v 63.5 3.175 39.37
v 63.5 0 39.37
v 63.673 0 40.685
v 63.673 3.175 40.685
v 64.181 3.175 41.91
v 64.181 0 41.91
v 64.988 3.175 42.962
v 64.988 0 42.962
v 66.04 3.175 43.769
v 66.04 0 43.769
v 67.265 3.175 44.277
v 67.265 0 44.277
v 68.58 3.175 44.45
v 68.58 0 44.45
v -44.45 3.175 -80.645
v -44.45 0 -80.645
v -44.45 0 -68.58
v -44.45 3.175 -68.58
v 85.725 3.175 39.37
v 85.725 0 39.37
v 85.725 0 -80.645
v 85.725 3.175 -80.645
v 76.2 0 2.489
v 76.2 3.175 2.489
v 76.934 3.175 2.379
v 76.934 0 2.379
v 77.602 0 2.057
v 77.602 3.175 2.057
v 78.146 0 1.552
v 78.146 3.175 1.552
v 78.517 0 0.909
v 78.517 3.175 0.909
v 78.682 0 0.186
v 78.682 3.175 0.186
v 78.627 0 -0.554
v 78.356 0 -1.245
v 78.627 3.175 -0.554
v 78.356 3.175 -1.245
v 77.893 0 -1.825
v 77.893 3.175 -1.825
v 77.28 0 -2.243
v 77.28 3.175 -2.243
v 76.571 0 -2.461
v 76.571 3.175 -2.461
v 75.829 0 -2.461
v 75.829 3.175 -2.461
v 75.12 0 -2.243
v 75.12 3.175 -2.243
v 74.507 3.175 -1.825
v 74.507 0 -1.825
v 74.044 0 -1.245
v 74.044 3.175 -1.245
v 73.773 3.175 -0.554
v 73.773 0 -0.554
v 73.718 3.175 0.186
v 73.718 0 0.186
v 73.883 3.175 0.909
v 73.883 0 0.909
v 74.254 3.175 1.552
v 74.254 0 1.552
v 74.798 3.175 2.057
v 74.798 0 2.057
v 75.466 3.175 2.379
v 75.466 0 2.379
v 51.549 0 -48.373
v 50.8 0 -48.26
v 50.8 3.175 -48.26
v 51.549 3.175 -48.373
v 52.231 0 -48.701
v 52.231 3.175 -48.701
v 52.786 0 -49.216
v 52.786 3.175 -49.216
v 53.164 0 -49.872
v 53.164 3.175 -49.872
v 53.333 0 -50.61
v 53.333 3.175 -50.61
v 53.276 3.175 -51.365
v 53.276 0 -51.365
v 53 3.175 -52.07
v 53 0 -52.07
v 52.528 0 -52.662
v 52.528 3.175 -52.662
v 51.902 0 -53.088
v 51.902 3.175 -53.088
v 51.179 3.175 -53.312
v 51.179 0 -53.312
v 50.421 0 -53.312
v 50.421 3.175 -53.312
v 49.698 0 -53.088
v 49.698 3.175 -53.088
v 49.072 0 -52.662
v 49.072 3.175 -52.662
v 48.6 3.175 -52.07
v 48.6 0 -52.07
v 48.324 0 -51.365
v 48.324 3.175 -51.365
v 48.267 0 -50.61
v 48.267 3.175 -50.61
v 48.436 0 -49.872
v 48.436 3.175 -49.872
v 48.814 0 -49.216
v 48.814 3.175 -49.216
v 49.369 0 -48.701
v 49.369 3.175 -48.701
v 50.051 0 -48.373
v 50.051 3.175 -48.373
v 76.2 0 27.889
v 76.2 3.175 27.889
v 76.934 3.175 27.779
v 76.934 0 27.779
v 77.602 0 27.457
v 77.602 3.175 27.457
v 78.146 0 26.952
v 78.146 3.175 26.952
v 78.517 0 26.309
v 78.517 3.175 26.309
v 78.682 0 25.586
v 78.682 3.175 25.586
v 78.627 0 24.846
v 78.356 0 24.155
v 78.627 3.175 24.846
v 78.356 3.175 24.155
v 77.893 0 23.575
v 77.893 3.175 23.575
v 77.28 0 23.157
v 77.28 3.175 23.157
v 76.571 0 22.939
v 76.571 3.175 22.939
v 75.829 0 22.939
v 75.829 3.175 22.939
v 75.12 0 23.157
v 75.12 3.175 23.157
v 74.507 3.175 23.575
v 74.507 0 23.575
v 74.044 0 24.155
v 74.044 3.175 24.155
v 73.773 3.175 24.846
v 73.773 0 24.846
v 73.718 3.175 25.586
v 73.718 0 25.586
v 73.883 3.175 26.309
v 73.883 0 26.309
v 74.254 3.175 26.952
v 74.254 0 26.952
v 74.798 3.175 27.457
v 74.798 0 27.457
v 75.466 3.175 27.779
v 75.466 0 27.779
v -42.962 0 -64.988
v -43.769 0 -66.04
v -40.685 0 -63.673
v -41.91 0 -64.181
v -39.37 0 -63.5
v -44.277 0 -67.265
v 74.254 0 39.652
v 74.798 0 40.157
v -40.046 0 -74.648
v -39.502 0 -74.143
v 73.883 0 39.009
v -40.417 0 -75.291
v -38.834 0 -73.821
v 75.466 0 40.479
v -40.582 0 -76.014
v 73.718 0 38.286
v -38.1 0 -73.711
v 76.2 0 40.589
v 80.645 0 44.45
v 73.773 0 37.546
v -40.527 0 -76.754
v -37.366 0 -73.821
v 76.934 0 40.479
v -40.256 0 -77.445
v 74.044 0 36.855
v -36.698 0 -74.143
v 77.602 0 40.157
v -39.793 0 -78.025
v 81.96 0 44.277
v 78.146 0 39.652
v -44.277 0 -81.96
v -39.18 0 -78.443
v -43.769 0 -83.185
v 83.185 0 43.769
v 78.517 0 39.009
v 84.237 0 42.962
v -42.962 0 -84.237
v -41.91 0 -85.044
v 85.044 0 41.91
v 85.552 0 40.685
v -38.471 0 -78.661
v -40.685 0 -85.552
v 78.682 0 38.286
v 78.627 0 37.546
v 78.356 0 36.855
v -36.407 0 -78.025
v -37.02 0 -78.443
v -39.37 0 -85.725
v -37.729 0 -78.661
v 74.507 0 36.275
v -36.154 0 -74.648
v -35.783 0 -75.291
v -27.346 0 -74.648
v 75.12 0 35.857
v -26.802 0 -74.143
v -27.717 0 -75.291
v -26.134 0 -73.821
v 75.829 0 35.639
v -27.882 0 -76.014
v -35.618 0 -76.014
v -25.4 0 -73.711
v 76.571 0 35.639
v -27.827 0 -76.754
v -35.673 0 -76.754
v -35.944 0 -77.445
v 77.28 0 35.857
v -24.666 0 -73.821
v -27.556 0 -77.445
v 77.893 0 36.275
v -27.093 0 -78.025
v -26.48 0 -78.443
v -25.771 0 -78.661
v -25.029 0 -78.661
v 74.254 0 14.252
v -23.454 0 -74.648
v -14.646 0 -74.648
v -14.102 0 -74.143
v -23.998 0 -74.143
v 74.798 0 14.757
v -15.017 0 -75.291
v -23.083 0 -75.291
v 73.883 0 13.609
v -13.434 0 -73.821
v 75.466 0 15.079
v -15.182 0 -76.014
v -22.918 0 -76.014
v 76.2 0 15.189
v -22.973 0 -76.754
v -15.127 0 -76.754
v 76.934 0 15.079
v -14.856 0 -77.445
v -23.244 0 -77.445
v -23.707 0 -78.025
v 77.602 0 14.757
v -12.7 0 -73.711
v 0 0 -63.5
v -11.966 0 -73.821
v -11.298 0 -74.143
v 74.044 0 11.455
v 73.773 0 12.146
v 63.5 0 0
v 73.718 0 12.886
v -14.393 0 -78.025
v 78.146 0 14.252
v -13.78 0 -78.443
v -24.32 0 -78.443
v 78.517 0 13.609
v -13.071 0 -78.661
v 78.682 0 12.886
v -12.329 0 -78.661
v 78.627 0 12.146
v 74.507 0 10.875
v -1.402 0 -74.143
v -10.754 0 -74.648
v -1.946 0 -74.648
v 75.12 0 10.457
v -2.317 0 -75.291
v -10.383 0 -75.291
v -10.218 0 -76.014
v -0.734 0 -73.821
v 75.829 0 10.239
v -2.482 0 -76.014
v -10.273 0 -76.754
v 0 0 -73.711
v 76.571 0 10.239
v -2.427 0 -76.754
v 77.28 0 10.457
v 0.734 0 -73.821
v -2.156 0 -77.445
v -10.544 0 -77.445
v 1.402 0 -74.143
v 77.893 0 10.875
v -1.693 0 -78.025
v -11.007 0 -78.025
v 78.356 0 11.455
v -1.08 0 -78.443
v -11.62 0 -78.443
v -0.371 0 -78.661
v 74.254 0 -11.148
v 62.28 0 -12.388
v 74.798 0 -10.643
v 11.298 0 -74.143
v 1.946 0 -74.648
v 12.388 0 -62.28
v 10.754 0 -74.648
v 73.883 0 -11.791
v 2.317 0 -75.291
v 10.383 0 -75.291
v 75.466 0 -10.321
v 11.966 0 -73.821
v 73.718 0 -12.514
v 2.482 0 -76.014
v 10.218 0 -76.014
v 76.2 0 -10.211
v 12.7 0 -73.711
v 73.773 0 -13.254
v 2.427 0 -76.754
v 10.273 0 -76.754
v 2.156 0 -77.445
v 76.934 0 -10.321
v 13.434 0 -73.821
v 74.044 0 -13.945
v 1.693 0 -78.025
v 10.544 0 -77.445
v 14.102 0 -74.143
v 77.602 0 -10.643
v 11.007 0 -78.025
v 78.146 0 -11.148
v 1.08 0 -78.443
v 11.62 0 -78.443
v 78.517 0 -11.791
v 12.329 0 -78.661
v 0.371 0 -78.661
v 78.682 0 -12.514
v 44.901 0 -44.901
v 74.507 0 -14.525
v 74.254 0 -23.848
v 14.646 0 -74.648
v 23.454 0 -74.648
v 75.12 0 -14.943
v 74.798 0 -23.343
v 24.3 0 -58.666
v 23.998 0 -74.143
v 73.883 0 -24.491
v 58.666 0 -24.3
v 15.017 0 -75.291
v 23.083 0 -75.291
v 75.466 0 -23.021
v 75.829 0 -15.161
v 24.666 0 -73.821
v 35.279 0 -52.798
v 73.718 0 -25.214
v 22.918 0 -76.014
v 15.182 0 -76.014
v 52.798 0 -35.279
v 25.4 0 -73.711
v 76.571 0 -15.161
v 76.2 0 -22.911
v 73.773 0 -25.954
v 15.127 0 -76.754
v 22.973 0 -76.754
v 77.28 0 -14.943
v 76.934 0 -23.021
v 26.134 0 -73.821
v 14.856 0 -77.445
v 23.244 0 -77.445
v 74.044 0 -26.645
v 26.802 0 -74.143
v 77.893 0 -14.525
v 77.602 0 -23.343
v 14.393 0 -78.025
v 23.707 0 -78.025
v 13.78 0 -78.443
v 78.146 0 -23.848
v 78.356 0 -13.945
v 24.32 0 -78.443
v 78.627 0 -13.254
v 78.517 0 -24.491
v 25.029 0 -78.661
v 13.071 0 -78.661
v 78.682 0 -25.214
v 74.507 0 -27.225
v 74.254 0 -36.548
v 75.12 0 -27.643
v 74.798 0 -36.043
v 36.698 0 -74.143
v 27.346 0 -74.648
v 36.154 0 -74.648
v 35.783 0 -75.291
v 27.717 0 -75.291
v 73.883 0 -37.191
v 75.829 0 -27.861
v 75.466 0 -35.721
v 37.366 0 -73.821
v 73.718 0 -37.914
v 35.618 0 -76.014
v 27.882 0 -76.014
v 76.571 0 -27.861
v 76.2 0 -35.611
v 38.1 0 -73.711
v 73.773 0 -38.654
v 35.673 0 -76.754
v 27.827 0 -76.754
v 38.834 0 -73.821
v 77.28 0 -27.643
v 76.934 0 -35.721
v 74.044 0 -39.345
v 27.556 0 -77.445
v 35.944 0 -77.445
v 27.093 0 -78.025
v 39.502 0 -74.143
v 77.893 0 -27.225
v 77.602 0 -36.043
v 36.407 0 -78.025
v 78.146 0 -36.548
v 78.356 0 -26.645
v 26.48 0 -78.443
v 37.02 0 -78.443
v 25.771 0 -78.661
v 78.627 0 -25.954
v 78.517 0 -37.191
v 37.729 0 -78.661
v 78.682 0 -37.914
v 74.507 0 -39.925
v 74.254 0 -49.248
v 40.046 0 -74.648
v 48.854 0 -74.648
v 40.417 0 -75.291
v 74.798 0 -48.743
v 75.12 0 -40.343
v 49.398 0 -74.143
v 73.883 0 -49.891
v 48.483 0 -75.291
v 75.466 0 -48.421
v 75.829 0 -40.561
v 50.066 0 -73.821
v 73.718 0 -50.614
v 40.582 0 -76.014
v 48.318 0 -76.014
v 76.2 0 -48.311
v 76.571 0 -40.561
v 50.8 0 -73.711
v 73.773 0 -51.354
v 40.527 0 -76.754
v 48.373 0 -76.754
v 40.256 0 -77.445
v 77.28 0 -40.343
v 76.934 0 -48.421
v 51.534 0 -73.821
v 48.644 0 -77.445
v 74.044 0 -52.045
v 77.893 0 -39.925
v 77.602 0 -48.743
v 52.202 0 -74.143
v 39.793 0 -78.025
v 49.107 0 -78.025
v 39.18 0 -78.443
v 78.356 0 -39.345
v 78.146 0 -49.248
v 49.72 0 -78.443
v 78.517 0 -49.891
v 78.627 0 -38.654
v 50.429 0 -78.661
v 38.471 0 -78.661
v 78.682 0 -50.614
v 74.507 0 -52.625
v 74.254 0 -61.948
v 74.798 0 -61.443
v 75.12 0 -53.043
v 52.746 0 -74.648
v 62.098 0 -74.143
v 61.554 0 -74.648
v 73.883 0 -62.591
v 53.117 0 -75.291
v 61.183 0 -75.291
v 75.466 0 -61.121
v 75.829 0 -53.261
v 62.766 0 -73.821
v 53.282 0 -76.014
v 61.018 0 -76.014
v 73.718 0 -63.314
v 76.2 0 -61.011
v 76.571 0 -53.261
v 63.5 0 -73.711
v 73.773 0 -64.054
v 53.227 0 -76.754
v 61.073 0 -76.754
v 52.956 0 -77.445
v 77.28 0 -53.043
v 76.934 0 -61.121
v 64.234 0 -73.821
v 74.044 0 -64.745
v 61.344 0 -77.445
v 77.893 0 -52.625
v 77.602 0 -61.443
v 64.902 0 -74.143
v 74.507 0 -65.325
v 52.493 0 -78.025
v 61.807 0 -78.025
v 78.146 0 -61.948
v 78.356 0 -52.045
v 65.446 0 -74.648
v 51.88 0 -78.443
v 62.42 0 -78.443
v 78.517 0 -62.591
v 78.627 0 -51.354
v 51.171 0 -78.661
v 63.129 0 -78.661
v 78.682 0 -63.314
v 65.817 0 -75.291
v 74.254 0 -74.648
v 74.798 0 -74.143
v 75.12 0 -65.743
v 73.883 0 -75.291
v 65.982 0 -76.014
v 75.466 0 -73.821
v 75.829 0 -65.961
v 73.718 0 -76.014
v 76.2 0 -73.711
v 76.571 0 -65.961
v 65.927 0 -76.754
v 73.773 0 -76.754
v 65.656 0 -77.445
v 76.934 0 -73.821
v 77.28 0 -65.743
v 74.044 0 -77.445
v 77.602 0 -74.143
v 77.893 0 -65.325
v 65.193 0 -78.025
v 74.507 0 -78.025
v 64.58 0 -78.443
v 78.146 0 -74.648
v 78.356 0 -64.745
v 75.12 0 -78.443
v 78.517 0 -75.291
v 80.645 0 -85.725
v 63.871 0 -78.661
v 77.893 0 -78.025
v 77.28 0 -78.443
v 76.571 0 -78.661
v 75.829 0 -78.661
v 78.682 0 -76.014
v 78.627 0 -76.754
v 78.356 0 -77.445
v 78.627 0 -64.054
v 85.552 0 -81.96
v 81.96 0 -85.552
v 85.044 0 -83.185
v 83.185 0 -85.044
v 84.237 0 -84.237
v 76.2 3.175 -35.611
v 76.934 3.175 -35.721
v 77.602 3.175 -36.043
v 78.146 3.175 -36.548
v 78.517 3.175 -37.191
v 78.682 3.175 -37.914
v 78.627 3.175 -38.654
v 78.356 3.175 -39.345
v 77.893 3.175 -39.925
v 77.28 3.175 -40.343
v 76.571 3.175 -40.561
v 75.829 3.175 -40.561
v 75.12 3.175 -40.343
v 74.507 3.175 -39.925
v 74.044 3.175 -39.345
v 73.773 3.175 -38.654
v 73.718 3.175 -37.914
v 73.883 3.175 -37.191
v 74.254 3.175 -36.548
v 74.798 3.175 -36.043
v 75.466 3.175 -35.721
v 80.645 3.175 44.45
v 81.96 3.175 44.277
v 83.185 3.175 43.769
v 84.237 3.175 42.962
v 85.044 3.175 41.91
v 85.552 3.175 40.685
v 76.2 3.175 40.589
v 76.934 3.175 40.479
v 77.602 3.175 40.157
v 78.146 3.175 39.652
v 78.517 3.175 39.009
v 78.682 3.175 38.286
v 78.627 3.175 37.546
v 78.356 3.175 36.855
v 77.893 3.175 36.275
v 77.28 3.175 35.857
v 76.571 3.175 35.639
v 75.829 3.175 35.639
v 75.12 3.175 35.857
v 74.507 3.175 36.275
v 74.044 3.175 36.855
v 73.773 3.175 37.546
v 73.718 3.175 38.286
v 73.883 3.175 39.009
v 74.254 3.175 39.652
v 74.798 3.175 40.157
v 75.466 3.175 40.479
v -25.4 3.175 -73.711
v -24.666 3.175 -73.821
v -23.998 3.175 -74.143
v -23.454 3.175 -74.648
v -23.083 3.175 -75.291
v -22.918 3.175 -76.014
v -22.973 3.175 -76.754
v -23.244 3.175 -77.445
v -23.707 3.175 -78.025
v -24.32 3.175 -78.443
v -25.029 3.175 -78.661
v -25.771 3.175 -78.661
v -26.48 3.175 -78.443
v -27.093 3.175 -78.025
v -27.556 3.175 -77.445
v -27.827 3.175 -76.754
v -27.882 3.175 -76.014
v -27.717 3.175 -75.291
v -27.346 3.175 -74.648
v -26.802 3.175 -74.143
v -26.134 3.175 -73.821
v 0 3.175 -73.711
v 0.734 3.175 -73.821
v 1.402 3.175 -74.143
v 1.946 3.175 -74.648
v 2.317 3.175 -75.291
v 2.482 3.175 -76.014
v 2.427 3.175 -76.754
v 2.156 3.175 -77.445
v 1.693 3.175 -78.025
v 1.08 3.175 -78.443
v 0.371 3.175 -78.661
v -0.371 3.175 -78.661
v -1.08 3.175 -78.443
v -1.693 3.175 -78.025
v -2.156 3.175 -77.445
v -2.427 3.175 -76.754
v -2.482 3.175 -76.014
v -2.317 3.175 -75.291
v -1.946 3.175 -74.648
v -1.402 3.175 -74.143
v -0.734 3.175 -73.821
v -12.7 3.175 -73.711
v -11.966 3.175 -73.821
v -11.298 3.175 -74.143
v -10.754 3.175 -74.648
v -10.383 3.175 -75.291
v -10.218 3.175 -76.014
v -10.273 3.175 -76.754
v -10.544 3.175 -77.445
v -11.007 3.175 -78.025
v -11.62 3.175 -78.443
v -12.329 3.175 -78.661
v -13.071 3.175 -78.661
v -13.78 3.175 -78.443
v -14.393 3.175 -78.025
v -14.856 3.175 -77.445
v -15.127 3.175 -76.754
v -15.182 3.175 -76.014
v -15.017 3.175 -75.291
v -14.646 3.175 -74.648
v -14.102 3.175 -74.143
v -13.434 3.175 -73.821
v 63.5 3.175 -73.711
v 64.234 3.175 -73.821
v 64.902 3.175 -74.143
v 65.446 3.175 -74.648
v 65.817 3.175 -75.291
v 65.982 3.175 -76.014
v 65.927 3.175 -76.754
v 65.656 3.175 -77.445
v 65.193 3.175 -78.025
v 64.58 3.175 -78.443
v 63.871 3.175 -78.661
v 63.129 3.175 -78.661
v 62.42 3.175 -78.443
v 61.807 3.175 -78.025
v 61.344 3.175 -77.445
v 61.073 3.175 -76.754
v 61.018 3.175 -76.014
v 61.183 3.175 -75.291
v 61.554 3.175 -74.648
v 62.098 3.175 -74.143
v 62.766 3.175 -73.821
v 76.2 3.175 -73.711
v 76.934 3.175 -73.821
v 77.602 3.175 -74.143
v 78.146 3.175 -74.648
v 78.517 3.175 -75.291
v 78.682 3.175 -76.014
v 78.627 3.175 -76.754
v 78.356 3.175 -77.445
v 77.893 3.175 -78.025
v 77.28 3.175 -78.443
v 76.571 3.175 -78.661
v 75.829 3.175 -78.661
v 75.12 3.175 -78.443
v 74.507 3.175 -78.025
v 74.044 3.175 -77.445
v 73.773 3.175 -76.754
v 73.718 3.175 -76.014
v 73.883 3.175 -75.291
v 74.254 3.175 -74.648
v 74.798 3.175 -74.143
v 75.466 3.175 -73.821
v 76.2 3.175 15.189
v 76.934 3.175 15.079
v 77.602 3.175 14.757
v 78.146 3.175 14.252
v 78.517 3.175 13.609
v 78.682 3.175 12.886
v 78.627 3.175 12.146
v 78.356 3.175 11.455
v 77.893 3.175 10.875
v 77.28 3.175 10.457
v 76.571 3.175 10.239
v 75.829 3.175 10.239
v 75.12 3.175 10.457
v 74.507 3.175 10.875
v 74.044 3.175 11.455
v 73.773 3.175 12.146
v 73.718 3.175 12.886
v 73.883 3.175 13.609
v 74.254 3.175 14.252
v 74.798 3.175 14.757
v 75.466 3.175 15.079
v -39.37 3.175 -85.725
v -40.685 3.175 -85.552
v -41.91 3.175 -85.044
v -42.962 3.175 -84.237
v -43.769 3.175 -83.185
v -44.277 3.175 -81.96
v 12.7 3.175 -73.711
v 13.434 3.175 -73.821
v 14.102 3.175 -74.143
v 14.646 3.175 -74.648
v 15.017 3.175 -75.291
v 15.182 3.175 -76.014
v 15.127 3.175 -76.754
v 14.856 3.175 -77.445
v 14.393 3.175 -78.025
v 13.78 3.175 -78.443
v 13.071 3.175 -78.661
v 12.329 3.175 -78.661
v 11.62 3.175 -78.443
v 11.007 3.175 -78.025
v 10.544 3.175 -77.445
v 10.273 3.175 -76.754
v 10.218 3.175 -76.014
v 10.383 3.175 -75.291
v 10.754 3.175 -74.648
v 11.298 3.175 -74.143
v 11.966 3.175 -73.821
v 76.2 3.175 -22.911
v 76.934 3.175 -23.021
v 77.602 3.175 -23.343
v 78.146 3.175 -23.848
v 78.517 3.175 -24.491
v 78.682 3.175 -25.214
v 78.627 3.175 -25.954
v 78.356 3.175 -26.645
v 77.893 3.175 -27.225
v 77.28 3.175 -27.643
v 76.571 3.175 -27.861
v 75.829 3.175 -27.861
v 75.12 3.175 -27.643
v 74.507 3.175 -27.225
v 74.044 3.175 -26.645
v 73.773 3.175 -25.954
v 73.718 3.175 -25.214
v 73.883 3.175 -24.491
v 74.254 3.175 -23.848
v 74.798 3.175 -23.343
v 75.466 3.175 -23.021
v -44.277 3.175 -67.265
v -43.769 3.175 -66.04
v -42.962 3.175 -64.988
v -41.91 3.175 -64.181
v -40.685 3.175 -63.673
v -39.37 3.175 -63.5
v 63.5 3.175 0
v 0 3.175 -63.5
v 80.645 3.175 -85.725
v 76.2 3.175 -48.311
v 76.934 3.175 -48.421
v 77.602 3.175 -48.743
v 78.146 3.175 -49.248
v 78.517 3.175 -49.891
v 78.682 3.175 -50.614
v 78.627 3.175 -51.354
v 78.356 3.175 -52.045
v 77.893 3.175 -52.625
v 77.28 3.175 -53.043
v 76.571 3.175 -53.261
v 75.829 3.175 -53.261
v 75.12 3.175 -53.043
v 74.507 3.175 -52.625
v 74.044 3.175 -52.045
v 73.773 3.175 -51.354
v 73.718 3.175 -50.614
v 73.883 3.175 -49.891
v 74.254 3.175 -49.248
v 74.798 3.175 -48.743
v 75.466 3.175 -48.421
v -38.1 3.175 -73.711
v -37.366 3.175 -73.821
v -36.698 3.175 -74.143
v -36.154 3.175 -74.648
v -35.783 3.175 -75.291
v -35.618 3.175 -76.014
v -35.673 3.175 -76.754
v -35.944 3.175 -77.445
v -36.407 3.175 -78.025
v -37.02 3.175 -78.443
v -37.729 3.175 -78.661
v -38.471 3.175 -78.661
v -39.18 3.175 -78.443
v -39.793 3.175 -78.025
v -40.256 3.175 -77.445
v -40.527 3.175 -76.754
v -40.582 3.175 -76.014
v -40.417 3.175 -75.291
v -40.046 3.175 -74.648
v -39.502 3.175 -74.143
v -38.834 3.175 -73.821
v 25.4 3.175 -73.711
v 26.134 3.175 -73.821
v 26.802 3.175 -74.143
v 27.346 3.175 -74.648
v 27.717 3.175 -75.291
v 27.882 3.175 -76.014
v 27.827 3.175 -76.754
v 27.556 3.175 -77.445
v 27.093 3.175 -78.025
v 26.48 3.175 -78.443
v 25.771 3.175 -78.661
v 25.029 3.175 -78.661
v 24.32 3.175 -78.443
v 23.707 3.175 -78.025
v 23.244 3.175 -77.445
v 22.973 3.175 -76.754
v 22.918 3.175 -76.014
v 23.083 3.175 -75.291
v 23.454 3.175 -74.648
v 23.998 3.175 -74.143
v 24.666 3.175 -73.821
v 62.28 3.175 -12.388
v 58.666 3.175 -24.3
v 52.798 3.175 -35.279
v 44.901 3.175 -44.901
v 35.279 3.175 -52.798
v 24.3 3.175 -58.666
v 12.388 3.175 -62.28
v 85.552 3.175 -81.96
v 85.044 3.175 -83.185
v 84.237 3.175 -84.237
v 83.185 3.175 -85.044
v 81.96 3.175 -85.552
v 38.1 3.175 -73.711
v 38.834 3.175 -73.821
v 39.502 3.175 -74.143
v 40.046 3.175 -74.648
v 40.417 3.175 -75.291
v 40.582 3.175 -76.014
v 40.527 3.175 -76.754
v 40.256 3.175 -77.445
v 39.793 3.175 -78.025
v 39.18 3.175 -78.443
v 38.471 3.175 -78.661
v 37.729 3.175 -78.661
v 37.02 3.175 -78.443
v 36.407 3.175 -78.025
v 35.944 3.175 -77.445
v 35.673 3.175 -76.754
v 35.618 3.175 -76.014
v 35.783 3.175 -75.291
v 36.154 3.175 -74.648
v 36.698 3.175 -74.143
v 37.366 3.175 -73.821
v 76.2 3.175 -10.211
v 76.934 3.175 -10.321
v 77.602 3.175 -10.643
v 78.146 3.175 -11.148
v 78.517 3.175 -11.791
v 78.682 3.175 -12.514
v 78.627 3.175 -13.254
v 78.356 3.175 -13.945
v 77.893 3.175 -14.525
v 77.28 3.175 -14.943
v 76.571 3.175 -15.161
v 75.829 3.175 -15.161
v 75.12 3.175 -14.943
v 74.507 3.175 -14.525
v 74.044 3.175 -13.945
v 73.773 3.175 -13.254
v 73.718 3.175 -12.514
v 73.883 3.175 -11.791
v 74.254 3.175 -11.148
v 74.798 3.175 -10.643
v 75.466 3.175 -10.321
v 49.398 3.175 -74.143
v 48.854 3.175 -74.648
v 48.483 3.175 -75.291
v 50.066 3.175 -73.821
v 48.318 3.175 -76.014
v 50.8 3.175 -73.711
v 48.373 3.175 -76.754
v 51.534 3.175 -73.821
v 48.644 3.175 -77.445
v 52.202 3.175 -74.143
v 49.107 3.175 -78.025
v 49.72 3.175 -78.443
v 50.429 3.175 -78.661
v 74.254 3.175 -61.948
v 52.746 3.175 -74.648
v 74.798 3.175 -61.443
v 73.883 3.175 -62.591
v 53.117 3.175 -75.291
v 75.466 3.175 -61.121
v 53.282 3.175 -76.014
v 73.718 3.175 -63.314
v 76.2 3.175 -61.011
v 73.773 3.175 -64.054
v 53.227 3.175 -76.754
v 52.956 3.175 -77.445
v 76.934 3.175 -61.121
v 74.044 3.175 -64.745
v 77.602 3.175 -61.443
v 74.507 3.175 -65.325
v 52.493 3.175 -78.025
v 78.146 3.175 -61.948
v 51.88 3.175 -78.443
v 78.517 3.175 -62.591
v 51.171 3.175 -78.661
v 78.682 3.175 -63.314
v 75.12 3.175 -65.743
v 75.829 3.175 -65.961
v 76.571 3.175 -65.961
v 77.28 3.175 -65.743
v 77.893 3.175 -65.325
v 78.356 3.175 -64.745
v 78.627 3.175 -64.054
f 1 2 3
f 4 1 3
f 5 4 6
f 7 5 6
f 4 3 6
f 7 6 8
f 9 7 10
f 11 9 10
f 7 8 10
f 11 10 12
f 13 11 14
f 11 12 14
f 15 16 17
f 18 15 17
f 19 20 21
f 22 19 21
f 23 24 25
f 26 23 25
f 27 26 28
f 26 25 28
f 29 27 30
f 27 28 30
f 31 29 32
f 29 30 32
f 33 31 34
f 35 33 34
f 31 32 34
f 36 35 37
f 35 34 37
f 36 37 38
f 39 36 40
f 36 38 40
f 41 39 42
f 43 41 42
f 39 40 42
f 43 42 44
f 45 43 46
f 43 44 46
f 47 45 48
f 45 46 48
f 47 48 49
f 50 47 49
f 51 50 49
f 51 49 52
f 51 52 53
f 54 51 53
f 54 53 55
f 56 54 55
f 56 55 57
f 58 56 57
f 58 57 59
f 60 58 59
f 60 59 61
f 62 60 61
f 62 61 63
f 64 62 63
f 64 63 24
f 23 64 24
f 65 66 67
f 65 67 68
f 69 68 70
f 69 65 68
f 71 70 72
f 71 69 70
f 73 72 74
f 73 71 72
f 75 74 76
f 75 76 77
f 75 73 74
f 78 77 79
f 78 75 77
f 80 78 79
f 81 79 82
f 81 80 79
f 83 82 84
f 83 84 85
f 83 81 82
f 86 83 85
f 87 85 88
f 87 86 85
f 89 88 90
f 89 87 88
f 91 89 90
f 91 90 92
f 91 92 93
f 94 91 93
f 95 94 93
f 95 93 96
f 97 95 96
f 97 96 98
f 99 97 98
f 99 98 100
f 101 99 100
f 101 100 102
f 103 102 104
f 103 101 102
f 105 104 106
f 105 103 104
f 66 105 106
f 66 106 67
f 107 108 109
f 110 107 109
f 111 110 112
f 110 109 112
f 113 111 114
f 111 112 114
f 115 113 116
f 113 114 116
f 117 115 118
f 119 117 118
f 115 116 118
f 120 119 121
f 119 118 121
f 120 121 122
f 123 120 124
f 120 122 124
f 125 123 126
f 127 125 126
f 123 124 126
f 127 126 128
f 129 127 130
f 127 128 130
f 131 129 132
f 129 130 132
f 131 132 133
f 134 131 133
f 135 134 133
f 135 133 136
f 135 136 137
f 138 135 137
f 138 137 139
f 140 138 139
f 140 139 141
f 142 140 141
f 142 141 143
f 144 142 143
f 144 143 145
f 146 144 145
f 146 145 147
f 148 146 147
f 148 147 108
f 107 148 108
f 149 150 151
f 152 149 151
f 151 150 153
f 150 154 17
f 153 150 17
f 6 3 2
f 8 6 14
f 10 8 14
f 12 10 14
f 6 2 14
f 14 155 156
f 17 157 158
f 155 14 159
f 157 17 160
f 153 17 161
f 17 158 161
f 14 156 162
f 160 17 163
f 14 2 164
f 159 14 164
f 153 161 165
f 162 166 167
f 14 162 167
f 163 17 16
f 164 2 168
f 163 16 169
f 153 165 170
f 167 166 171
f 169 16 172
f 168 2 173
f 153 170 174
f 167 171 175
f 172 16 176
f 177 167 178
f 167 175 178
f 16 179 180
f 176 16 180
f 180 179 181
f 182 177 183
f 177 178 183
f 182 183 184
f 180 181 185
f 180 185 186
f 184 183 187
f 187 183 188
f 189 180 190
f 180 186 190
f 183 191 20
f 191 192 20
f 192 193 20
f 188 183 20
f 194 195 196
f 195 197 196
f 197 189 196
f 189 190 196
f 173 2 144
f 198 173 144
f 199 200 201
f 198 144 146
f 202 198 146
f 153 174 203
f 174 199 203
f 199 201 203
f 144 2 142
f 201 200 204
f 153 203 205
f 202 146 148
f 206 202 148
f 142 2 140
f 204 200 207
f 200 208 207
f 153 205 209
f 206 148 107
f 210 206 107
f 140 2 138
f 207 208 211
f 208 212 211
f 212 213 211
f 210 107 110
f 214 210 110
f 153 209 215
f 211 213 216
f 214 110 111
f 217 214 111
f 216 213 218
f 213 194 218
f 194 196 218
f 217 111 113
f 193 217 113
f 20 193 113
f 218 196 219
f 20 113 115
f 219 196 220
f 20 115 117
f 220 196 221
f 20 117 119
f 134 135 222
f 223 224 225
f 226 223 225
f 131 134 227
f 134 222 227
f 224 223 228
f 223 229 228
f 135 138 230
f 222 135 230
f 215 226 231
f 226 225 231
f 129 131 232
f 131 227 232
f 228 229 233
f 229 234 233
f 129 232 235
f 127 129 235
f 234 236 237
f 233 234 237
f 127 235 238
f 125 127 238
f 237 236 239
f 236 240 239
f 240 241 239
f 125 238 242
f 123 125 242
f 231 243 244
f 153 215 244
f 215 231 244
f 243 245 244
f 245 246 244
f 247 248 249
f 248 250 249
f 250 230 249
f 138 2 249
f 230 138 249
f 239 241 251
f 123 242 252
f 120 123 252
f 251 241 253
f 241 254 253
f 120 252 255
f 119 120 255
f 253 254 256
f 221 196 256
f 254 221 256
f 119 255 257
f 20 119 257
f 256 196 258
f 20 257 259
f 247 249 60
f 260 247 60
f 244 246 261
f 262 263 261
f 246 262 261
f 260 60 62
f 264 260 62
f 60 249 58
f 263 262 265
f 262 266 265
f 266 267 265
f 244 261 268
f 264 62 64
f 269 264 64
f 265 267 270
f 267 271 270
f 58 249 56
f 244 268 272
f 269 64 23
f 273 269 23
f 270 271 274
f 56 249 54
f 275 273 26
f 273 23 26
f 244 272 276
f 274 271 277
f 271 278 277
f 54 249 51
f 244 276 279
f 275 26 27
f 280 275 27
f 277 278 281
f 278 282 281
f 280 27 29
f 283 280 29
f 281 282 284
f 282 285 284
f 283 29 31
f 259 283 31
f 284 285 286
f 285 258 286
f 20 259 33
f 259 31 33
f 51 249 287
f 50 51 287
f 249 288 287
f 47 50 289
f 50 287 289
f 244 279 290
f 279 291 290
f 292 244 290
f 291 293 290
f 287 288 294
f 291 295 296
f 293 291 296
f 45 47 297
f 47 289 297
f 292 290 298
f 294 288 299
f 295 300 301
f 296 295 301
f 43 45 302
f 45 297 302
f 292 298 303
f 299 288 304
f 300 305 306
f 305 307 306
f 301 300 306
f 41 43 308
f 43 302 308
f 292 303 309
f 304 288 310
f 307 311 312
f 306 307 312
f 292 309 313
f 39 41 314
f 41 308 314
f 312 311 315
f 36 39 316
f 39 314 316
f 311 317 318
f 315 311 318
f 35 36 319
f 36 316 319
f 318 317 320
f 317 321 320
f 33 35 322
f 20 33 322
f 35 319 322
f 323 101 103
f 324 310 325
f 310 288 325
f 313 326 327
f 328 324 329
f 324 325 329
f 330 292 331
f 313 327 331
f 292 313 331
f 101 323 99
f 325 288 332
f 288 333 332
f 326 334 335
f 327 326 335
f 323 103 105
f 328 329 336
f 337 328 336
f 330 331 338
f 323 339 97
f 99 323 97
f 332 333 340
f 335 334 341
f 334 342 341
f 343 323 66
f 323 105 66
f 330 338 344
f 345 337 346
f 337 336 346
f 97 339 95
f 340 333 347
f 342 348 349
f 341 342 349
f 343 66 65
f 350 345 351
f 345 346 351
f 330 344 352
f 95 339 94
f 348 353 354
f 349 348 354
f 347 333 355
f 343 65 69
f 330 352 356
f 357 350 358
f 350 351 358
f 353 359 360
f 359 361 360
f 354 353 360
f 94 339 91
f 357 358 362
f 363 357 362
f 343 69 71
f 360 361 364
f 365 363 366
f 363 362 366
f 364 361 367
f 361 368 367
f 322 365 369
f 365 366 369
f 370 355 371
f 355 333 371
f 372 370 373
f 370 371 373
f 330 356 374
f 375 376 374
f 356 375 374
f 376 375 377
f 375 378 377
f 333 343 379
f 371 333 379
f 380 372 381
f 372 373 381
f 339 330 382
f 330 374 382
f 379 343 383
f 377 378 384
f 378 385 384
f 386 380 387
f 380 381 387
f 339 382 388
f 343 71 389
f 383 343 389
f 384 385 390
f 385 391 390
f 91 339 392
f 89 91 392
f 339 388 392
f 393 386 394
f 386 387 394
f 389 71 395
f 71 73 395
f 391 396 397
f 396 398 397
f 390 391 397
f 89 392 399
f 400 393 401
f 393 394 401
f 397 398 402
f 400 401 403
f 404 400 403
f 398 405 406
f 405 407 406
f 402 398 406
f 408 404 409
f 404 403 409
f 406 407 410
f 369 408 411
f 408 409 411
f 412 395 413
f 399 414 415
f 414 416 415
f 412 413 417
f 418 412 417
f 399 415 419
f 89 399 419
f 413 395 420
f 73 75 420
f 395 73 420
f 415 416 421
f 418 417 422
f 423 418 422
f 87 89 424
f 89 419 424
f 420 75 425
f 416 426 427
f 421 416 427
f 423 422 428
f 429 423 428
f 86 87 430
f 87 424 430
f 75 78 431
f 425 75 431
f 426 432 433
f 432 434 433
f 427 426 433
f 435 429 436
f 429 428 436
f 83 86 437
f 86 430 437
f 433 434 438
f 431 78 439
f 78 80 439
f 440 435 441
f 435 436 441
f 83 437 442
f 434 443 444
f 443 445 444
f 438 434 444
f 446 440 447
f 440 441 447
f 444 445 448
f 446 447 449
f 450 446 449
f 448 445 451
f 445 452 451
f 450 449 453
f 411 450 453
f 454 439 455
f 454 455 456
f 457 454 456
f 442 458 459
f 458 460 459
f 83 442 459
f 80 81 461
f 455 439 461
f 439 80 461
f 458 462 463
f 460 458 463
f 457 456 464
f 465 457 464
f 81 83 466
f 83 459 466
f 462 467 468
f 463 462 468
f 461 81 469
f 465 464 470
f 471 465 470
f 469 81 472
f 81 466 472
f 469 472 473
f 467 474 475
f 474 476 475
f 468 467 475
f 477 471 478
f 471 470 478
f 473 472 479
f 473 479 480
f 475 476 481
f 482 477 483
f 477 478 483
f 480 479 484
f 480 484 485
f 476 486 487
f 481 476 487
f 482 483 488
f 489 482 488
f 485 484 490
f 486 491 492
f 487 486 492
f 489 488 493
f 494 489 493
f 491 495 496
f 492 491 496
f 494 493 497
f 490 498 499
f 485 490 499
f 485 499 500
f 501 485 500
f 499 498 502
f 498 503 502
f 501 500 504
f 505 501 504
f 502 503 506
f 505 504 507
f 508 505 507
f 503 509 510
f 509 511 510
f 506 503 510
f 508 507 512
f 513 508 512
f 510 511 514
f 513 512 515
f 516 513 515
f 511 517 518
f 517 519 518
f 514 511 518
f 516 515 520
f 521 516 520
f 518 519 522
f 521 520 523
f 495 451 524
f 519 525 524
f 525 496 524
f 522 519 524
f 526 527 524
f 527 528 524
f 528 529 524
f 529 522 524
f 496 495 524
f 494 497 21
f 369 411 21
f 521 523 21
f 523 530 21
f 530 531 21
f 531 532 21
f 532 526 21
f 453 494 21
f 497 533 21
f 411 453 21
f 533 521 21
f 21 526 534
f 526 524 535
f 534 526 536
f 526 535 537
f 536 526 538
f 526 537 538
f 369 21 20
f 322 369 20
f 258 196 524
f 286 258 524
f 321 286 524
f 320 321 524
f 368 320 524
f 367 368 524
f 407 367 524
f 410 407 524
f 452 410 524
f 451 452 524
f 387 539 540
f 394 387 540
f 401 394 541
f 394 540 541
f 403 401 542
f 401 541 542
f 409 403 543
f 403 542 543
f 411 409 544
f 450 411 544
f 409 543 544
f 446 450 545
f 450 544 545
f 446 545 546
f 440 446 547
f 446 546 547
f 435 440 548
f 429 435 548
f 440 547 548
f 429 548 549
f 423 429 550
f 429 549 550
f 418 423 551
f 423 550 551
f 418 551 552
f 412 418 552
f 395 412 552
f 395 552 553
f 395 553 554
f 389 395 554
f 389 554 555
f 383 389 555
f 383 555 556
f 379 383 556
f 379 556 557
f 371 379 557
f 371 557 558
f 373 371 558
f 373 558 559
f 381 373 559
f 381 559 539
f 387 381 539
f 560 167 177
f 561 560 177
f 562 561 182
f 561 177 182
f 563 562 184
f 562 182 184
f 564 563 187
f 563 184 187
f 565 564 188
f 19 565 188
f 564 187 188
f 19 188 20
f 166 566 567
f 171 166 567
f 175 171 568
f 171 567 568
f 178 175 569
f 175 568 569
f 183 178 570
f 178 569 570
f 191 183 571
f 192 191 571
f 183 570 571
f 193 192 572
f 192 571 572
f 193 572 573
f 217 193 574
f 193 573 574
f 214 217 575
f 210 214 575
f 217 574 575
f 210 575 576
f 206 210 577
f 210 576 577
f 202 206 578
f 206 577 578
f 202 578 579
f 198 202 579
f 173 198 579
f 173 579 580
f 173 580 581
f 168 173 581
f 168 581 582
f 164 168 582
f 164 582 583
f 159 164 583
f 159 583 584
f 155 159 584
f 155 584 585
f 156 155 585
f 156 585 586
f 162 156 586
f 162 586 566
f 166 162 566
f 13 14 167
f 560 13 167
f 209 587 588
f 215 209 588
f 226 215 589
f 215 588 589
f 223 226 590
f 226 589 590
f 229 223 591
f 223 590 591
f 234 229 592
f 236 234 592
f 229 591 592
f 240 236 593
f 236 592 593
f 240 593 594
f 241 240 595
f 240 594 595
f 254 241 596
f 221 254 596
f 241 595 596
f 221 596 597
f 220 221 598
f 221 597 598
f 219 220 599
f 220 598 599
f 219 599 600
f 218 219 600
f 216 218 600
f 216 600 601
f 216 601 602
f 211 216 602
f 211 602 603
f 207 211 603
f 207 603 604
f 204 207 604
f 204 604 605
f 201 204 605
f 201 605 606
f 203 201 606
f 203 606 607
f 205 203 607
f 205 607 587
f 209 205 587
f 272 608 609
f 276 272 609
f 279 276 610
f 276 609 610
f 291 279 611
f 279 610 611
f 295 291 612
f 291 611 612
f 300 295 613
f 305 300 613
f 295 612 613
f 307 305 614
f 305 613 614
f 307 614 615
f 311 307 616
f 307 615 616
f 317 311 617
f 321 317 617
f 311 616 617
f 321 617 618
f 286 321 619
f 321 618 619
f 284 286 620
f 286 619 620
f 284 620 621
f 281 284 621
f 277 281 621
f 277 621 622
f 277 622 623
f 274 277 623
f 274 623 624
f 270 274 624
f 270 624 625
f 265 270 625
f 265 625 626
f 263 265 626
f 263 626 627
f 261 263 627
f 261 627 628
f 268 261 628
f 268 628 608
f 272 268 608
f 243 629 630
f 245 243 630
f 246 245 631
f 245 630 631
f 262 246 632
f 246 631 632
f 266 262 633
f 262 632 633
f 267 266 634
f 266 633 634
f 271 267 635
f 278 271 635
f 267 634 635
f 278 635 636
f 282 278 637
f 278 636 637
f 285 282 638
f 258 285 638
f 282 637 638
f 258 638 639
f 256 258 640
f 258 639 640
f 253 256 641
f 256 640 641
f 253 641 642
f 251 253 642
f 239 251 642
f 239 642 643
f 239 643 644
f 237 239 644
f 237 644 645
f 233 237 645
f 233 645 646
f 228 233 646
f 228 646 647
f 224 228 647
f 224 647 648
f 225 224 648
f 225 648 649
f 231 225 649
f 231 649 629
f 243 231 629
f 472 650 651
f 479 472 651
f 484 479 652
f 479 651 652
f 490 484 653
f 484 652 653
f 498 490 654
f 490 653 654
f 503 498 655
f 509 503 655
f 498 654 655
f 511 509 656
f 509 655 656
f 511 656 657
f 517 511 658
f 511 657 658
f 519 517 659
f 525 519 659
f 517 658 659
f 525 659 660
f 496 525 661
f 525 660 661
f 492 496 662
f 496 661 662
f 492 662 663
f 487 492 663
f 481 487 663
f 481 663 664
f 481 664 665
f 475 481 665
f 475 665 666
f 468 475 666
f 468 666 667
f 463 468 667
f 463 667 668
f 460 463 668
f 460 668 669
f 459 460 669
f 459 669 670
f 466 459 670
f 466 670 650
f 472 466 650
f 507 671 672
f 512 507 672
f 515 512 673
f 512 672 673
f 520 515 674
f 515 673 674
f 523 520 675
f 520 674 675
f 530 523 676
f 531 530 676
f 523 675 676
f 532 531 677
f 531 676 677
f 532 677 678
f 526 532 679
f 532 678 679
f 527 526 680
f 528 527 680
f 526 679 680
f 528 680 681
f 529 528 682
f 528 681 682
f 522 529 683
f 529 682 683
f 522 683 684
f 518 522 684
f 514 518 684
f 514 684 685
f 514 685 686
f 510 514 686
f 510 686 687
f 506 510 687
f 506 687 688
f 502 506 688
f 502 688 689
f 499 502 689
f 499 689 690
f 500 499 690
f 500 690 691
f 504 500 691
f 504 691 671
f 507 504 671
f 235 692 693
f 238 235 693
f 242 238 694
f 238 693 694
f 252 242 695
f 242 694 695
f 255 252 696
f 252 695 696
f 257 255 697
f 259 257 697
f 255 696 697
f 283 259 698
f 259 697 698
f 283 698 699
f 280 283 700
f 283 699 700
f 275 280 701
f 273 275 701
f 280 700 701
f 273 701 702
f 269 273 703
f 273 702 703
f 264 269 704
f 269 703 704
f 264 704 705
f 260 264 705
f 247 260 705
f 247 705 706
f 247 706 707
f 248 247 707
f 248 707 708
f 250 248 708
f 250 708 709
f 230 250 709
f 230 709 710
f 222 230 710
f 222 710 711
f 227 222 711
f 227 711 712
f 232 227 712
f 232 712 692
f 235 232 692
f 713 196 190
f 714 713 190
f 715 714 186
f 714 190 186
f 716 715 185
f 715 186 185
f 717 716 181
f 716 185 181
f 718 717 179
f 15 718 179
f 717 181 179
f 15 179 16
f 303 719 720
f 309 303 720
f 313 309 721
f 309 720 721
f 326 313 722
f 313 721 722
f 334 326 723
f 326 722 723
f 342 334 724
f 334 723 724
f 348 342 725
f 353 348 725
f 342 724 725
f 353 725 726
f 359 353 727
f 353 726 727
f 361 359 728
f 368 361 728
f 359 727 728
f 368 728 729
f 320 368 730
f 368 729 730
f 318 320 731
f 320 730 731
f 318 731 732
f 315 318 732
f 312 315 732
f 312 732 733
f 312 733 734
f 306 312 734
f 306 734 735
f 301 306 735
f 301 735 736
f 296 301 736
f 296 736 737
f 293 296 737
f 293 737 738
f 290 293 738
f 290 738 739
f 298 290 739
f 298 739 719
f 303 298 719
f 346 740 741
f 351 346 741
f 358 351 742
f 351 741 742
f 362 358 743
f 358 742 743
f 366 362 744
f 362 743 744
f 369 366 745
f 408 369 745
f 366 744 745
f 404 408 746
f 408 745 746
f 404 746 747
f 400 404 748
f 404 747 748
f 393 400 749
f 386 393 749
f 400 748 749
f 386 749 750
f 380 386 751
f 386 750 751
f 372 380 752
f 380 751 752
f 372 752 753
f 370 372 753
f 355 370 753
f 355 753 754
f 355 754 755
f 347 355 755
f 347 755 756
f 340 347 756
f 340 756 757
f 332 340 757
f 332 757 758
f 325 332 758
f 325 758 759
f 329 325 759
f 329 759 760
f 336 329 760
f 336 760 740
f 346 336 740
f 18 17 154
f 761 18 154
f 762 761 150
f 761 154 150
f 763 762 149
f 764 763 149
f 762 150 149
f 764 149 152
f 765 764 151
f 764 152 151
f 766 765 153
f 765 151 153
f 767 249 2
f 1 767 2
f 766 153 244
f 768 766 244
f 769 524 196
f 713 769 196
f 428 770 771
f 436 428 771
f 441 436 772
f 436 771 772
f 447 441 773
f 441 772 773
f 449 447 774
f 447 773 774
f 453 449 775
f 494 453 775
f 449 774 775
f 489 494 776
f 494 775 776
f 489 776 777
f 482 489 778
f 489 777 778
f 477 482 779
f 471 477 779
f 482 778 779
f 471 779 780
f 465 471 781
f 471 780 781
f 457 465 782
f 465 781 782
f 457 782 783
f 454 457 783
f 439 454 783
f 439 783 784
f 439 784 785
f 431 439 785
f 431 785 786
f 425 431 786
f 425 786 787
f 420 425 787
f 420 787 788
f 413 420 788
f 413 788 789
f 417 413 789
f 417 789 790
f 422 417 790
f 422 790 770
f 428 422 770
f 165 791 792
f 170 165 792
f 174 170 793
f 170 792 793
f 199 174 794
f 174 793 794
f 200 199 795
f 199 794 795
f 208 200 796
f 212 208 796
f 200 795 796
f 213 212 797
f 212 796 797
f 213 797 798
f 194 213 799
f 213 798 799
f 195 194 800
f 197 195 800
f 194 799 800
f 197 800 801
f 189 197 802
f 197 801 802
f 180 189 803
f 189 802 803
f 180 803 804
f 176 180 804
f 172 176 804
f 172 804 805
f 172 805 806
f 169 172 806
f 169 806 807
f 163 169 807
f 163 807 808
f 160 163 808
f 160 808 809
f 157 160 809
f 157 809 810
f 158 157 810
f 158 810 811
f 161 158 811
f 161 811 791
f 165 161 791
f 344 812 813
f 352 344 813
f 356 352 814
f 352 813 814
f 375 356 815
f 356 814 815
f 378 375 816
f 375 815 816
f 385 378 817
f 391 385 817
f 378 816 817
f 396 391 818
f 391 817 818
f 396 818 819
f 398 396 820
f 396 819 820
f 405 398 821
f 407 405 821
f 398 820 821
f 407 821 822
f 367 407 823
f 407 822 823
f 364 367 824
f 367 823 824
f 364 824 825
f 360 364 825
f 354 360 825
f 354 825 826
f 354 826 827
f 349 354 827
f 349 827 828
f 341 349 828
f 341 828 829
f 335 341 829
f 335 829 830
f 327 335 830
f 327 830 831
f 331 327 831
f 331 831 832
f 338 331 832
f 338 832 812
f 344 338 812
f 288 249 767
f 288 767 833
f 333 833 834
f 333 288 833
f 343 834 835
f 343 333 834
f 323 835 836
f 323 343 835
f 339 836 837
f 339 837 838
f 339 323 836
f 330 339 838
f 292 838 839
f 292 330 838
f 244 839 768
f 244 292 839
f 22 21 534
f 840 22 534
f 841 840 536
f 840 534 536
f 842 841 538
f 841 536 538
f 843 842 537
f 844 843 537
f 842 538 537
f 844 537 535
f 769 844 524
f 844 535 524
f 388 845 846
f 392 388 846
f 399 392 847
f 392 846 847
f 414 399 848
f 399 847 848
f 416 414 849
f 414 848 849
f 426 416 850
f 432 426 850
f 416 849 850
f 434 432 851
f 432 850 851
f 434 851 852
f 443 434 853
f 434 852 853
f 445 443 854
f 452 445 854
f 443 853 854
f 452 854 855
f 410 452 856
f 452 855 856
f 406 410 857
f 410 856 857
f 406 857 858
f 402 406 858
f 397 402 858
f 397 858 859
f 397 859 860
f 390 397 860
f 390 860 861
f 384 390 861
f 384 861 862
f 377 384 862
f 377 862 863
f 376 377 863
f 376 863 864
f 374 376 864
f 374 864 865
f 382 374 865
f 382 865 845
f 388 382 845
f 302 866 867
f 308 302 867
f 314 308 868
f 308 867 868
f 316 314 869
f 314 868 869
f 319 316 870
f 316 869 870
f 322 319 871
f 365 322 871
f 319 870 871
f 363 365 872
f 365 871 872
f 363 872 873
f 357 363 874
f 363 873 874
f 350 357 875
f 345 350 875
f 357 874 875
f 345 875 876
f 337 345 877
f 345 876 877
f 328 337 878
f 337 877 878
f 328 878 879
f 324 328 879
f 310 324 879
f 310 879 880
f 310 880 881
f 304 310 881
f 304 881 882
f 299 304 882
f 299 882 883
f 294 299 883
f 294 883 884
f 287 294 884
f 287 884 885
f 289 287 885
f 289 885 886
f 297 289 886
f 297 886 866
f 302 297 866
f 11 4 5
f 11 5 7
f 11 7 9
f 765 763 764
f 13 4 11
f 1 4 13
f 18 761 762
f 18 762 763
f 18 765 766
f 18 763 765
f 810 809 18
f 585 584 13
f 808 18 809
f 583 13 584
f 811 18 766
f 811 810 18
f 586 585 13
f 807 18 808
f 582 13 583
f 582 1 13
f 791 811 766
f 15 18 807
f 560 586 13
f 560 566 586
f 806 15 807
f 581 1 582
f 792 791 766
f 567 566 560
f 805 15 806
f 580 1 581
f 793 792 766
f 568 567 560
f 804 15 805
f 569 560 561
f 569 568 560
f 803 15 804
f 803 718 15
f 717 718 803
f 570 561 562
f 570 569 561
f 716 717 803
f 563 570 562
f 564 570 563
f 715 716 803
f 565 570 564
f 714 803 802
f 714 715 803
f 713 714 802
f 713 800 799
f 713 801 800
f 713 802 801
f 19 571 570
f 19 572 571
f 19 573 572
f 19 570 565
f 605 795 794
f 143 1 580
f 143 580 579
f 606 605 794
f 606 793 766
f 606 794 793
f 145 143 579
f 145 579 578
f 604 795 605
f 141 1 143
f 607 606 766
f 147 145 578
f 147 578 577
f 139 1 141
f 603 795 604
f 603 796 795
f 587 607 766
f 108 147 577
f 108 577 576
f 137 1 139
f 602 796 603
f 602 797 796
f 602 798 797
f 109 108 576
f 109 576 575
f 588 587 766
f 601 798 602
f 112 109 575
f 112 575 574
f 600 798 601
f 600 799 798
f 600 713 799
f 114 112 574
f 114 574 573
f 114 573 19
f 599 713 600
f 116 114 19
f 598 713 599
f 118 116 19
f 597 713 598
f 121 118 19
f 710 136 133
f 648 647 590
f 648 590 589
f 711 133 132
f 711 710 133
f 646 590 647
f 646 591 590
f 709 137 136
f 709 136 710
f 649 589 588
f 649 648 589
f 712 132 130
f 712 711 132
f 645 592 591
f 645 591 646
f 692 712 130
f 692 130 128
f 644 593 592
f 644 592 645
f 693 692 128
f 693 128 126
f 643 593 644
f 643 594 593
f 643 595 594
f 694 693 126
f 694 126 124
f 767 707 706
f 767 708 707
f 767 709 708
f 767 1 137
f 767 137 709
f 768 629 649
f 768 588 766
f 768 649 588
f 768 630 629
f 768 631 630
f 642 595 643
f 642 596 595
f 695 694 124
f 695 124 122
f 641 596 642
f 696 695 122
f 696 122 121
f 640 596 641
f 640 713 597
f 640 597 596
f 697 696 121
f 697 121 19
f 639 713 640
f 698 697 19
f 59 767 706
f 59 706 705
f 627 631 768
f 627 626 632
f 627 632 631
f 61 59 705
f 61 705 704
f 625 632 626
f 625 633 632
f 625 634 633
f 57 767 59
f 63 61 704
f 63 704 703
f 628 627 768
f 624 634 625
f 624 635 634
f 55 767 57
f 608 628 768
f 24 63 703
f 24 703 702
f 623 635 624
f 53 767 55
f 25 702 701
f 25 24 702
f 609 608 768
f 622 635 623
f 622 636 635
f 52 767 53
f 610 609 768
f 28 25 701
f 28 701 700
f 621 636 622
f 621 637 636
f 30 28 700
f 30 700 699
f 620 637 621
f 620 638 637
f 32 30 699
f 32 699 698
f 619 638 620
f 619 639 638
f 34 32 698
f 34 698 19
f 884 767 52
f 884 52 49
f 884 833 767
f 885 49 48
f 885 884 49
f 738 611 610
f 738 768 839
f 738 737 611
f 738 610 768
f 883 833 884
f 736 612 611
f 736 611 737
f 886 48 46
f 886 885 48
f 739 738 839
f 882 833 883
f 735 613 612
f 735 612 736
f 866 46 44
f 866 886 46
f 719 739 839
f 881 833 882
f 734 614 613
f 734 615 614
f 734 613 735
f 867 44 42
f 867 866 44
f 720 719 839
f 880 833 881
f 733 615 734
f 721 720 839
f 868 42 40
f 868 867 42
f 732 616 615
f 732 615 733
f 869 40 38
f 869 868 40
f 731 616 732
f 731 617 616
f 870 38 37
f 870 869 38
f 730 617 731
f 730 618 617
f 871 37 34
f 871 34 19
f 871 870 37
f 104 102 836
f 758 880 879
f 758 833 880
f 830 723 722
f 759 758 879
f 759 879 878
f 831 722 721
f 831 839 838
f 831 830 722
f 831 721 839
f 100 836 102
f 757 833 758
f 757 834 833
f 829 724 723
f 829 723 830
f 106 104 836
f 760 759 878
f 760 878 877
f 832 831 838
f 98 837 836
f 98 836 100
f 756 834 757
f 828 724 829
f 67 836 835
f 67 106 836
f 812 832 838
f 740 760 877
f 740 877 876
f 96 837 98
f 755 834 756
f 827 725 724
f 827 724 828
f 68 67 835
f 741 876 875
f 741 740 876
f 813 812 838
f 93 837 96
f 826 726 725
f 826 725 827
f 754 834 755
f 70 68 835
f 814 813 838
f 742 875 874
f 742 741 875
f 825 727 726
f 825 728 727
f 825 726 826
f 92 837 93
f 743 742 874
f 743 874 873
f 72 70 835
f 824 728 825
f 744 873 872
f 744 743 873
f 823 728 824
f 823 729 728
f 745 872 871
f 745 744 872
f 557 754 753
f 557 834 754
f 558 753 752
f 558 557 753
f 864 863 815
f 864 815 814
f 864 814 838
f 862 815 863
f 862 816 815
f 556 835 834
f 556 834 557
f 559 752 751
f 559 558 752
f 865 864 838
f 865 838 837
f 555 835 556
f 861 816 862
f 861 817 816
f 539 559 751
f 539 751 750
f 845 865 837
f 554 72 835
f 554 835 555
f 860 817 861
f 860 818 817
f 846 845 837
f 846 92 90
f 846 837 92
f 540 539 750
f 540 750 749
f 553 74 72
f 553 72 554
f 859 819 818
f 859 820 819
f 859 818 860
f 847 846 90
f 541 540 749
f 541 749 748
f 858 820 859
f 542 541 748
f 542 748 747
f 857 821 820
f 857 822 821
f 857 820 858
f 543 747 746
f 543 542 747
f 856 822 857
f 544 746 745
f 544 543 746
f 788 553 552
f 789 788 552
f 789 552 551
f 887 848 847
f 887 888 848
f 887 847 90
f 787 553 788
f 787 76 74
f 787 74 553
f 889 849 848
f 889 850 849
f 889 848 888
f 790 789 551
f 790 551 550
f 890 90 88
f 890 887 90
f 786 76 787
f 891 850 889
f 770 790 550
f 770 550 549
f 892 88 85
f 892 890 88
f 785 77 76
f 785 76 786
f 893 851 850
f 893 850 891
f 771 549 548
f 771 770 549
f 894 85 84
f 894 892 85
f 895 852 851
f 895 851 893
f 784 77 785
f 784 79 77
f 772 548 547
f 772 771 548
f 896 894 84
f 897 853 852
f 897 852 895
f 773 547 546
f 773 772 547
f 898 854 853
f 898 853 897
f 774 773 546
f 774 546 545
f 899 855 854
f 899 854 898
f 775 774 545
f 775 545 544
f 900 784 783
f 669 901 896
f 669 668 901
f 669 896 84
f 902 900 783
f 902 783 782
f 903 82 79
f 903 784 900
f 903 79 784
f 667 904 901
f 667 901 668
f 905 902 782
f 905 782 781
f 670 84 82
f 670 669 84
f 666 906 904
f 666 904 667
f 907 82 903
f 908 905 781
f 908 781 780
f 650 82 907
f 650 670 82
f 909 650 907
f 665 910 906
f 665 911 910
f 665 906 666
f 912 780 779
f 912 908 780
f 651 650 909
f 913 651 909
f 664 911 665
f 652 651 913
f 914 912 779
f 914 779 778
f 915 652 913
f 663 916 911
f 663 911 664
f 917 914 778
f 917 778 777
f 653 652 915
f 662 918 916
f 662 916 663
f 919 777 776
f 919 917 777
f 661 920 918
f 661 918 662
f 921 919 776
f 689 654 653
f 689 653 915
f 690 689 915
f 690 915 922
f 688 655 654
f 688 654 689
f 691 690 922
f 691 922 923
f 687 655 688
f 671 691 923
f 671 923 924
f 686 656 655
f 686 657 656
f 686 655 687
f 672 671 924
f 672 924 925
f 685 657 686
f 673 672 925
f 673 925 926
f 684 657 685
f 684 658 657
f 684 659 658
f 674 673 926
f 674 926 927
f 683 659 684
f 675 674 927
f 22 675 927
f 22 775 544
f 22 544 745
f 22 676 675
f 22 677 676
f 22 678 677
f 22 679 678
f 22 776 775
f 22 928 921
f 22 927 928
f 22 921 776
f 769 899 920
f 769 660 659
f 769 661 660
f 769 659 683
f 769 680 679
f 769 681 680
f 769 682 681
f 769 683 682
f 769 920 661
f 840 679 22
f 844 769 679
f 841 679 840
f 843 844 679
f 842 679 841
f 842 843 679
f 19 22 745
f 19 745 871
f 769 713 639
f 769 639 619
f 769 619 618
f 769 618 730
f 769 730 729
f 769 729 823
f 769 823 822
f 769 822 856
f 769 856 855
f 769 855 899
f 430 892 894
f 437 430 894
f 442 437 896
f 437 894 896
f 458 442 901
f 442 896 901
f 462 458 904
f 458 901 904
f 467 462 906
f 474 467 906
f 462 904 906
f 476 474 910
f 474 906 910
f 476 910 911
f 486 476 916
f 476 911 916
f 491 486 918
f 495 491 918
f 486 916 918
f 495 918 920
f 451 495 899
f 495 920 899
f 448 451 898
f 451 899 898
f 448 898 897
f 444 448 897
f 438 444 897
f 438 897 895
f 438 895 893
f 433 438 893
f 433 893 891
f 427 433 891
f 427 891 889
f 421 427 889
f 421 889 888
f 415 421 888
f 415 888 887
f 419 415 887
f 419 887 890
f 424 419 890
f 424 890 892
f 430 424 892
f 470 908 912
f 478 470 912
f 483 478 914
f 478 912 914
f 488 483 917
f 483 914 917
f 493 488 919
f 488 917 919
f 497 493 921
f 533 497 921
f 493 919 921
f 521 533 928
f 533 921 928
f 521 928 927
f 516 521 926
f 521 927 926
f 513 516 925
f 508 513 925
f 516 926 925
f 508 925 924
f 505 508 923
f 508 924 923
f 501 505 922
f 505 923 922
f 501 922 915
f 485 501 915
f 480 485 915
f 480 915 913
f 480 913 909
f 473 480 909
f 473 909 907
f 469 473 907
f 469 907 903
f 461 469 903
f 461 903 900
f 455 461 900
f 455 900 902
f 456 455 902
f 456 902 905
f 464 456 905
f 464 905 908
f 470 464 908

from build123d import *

# Parameters (mm, degrees)
SKETCH1_R           = 2.4892
SKETCH1_R_2         = 2.54
BOSS_EXTRUDE1_DEPTH = 3.175
BOSS_EXTRUDE2_START = -3.175
SKETCH3_R           = 2.4892
BOSS_EXTRUDE2_DEPTH = 3.175
SKETCH4_R           = 2.4892
CUT_EXTRUDE1_DEPTH  = 122.275025768


with BuildPart() as part:
    # Sketch1 → Boss-Extrude1 (new body)
    with BuildSketch(Plane(origin=(0, 0, 0), x_dir=(1, 0, 0), z_dir=(0, 1, 0))):
        with BuildLine():
            Line((0, 63.5), (-33.02, 63.5))
            ThreePointArc((-33.02, 63.5), (-36.612102448, 64.987897552), (-38.1, 68.58))
            Line((-38.1, 68.58), (-38.1, 77.47))
            ThreePointArc((-38.1, 77.47), (-36.612102448, 81.062102448), (-33.02, 82.55))
            Line((-33.02, 82.55), (77.47, 82.55))
            ThreePointArc((77.47, 82.55), (81.062102448, 81.062102448), (82.55, 77.47))
            Line((82.55, 77.47), (82.55, -33.02))
            ThreePointArc((82.55, -33.02), (81.062102448, -36.612102448), (77.47, -38.1))
            Line((77.47, -38.1), (68.58, -38.1))
            ThreePointArc((68.58, -38.1), (64.987897552, -36.612102448), (63.5, -33.02))
            Line((63.5, -33.02), (63.5, 0))
            ThreePointArc((63.5, 0), (44.901280605, 44.901280605), (0, 63.5))
        make_face()
        with Locations(Location((-28.575, 73.025, 0), (0, 0, 270))):
            Circle(SKETCH1_R, mode=Mode.SUBTRACT)
        with Locations(Location((-15.875, 73.025, 0), (0, 0, 270))):
            Circle(SKETCH1_R, mode=Mode.SUBTRACT)
        with Locations(Location((-3.175, 73.025, 0), (0, 0, 270))):
            Circle(SKETCH1_R, mode=Mode.SUBTRACT)
        with Locations(Location((9.525, 73.025, 0), (0, 0, 270))):
            Circle(SKETCH1_R, mode=Mode.SUBTRACT)
        with Locations(Location((22.225, 73.025, 0), (0, 0, 270))):
            Circle(SKETCH1_R, mode=Mode.SUBTRACT)
        with Locations(Location((34.925, 73.025, 0), (0, 0, 270))):
            Circle(SKETCH1_R, mode=Mode.SUBTRACT)
        with Locations(Location((47.625, 73.025, 0), (0, 0, 270))):
            Circle(SKETCH1_R, mode=Mode.SUBTRACT)
        with Locations(Location((60.325, 73.025, 0), (0, 0, 270))):
            Circle(SKETCH1_R, mode=Mode.SUBTRACT)
        with Locations(Location((73.025, 73.025, 0), (0, 0, 270))):
            Circle(SKETCH1_R, mode=Mode.SUBTRACT)
        with Locations(Location((73.025, 60.325, 0), (0, 0, 270))):
            Circle(SKETCH1_R, mode=Mode.SUBTRACT)
        with Locations(Location((73.025, 47.625, 0), (0, 0, 270))):
            Circle(SKETCH1_R, mode=Mode.SUBTRACT)
        with Locations(Location((73.025, 34.925, 0), (0, 0, 270))):
            Circle(SKETCH1_R, mode=Mode.SUBTRACT)
        with Locations(Location((73.025, 22.225, 0), (0, 0, 270))):
            Circle(SKETCH1_R, mode=Mode.SUBTRACT)
        with Locations(Location((73.025, 9.525, 0), (0, 0, 270))):
            Circle(SKETCH1_R, mode=Mode.SUBTRACT)
        with Locations(Location((73.025, -3.175, 0), (0, 0, 270))):
            Circle(SKETCH1_R, mode=Mode.SUBTRACT)
        with Locations(Location((73.025, -15.875, 0), (0, 0, 270))):
            Circle(SKETCH1_R, mode=Mode.SUBTRACT)
        with Locations(Location((73.025, -28.575, 0), (0, 0, 270))):
            Circle(SKETCH1_R, mode=Mode.SUBTRACT)
        with Locations(Location((50.8, 50.8, 0), (0, 0, 270))):
            Circle(SKETCH1_R_2, mode=Mode.SUBTRACT)
    extrude(amount=BOSS_EXTRUDE1_DEPTH)

    # Sketch3 → Boss-Extrude2 (add)
    with BuildSketch(Plane(origin=(0, 3.175, 0), x_dir=(1, 0, 0), z_dir=(0, 1, 0)).offset(BOSS_EXTRUDE2_START)):
        with BuildLine():
            ThreePointArc((-33.02, 63.5), (-35.859806331, 64.367886516), (-37.729286039, 66.675))
            ThreePointArc((-37.729286039, 66.675), (-38.006460322, 67.609632307), (-38.1, 68.58))
            Line((-38.1, 68.58), (-38.1, 77.47))
            ThreePointArc((-38.1, 77.47), (-36.612102448, 81.062102448), (-33.02, 82.55))
            Line((-33.02, 82.55), (77.47, 82.55))
            ThreePointArc((77.47, 82.55), (81.062102448, 81.062102448), (82.55, 77.47))
            Line((82.55, 77.47), (82.55, -33.02))
            ThreePointArc((82.55, -33.02), (81.062102448, -36.612102448), (77.47, -38.1))
            Line((77.47, -38.1), (68.58, -38.1))
            ThreePointArc((68.58, -38.1), (67.609632307, -38.006460322), (66.675, -37.729286039))
            ThreePointArc((66.675, -37.729286039), (64.367886516, -35.859806331), (63.5, -33.02))
            Line((63.5, -33.02), (63.5, -39.37))
            ThreePointArc((63.5, -39.37), (64.987897552, -42.962102448), (68.58, -44.45))
            Line((68.58, -44.45), (80.645, -44.45))
            ThreePointArc((80.645, -44.45), (84.237102448, -42.962102448), (85.725, -39.37))
            Line((85.725, -39.37), (85.725, 80.645))
            ThreePointArc((85.725, 80.645), (84.237102448, 84.237102448), (80.645, 85.725))
            Line((80.645, 85.725), (-39.37, 85.725))
            ThreePointArc((-39.37, 85.725), (-42.962102448, 84.237102448), (-44.45, 80.645))
            Line((-44.45, 80.645), (-44.45, 68.58))
            ThreePointArc((-44.45, 68.58), (-42.962102448, 64.987897552), (-39.37, 63.5))
            Line((-39.37, 63.5), (-33.02, 63.5))
        make_face()
        with Locations((73.025, -28.575)):
            Circle(SKETCH3_R)
        with Locations((73.025, -15.875)):
            Circle(SKETCH3_R)
        with Locations((73.025, -3.175)):
            Circle(SKETCH3_R)
        with Locations((73.025, 9.525)):
            Circle(SKETCH3_R)
        with Locations((73.025, 22.225)):
            Circle(SKETCH3_R)
        with Locations((73.025, 34.925)):
            Circle(SKETCH3_R)
        with Locations((73.025, 47.625)):
            Circle(SKETCH3_R)
        with Locations((73.025, 60.325)):
            Circle(SKETCH3_R)
        with Locations((73.025, 73.025)):
            Circle(SKETCH3_R)
        with Locations((60.325, 73.025)):
            Circle(SKETCH3_R)
        with Locations((47.625, 73.025)):
            Circle(SKETCH3_R)
        with Locations((34.925, 73.025)):
            Circle(SKETCH3_R)
        with Locations((22.225, 73.025)):
            Circle(SKETCH3_R)
        with Locations((9.525, 73.025)):
            Circle(SKETCH3_R)
        with Locations((-3.175, 73.025)):
            Circle(SKETCH3_R)
        with Locations((-15.875, 73.025)):
            Circle(SKETCH3_R)
        with Locations((-28.575, 73.025)):
            Circle(SKETCH3_R)
    extrude(amount=BOSS_EXTRUDE2_DEPTH)

    # Sketch4 → Cut-Extrude1 (cut, through all)
    with BuildSketch(Plane(origin=(0, 3.175, 0), x_dir=(1, 0, 0), z_dir=(0, 1, 0))):
        with Locations(Location((63.5, 76.2, 0), (0, 0, 270))):
            Circle(SKETCH4_R)
        with Locations(Location((76.2, 76.2, 0), (0, 0, 270))):
            Circle(SKETCH4_R)
        with Locations(Location((76.2, 63.5, 0), (0, 0, 270))):
            Circle(SKETCH4_R)
        with Locations(Location((76.2, 50.8, 0), (0, 0, 270))):
            Circle(SKETCH4_R)
        with Locations(Location((76.2, 38.1, 0), (0, 0, 270))):
            Circle(SKETCH4_R)
        with Locations(Location((50.8, 76.2, 0), (0, 0, 270))):
            Circle(SKETCH4_R)
        with Locations(Location((38.1, 76.2, 0), (0, 0, 270))):
            Circle(SKETCH4_R)
        with Locations(Location((25.4, 76.2, 0), (0, 0, 270))):
            Circle(SKETCH4_R)
        with Locations(Location((76.2, -25.4, 0), (0, 0, 270))):
            Circle(SKETCH4_R)
        with Locations(Location((76.2, -12.7, 0), (0, 0, 270))):
            Circle(SKETCH4_R)
        with Locations(Location((76.2, 0, 0), (0, 0, 270))):
            Circle(SKETCH4_R)
        with Locations(Location((76.2, 12.7, 0), (0, 0, 270))):
            Circle(SKETCH4_R)
        with Locations(Location((76.2, 25.4, 0), (0, 0, 270))):
            Circle(SKETCH4_R)
        with Locations(Location((12.7, 76.2, 0), (0, 0, 270))):
            Circle(SKETCH4_R)
        with Locations(Location((0, 76.2, 0), (0, 0, 270))):
            Circle(SKETCH4_R)
        with Locations(Location((-12.7, 76.2, 0), (0, 0, 270))):
            Circle(SKETCH4_R)
        with Locations(Location((-38.1, 76.2, 0), (0, 0, 270))):
            Circle(SKETCH4_R)
        with Locations(Location((-25.4, 76.2, 0), (0, 0, 270))):
            Circle(SKETCH4_R)
        with Locations(Location((76.2, -38.1, 0), (0, 0, 270))):
            Circle(SKETCH4_R)
    extrude(amount=-CUT_EXTRUDE1_DEPTH, mode=Mode.SUBTRACT)


solid = part.part
